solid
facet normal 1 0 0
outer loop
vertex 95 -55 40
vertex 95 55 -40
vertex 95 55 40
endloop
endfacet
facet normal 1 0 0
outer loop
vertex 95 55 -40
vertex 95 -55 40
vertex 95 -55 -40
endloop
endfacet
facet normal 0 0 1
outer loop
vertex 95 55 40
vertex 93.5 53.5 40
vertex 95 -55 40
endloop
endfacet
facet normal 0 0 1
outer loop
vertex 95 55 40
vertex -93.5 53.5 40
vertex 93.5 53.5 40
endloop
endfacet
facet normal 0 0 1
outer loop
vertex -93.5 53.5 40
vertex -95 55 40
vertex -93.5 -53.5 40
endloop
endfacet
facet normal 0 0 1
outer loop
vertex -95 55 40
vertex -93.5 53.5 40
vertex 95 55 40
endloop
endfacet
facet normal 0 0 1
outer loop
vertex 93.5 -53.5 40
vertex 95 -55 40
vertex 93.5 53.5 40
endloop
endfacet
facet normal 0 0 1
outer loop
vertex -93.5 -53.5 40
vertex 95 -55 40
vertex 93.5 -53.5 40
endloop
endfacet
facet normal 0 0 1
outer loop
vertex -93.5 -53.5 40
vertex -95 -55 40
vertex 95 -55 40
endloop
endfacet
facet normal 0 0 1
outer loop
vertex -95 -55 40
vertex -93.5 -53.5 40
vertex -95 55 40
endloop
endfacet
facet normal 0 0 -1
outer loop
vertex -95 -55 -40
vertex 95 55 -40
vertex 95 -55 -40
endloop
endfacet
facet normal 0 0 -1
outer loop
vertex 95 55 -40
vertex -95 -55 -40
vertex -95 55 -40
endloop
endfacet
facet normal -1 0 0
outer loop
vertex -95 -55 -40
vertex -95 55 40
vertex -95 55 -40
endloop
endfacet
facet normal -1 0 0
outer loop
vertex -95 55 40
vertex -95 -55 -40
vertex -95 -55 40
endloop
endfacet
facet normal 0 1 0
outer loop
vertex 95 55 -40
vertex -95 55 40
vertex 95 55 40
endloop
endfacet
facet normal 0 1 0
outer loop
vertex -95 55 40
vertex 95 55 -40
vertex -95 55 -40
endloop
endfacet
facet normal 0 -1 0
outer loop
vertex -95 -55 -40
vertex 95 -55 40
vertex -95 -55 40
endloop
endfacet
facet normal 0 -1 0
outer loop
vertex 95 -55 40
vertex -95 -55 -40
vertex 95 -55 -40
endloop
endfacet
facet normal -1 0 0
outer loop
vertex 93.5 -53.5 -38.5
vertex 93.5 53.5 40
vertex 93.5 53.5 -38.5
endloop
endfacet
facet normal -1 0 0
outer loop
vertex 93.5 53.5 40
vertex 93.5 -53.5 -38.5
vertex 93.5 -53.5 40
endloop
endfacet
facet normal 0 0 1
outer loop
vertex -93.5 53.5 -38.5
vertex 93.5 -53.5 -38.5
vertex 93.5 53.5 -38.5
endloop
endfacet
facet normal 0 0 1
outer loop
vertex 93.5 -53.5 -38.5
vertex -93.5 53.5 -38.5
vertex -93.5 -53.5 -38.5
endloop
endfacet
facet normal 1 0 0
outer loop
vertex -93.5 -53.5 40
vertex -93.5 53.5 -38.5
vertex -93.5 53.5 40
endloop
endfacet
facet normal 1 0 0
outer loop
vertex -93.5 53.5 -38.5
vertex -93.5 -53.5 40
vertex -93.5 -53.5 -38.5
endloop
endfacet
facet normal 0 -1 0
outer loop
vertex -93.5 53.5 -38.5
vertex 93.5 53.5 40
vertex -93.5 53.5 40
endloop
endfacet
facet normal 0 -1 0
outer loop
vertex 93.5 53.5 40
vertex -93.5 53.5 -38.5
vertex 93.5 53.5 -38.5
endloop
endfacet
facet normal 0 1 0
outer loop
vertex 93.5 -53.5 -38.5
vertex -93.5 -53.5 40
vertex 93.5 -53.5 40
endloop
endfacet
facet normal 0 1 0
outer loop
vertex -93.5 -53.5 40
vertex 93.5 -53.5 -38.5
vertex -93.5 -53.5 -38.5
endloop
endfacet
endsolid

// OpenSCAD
// ========================================
// a 19 x 11 x 8 cm enclosure with 0.15 cm wall thickness
// NeuroCAD canonical IR; dimensions are millimetres
// ========================================
$fn = 48;

difference() {
  cube(size=[190, 110, 80], center=true);
  translate([0, 0, 0.85]) {
    cube(size=[187, 107, 78.7], center=true);
  }
}
